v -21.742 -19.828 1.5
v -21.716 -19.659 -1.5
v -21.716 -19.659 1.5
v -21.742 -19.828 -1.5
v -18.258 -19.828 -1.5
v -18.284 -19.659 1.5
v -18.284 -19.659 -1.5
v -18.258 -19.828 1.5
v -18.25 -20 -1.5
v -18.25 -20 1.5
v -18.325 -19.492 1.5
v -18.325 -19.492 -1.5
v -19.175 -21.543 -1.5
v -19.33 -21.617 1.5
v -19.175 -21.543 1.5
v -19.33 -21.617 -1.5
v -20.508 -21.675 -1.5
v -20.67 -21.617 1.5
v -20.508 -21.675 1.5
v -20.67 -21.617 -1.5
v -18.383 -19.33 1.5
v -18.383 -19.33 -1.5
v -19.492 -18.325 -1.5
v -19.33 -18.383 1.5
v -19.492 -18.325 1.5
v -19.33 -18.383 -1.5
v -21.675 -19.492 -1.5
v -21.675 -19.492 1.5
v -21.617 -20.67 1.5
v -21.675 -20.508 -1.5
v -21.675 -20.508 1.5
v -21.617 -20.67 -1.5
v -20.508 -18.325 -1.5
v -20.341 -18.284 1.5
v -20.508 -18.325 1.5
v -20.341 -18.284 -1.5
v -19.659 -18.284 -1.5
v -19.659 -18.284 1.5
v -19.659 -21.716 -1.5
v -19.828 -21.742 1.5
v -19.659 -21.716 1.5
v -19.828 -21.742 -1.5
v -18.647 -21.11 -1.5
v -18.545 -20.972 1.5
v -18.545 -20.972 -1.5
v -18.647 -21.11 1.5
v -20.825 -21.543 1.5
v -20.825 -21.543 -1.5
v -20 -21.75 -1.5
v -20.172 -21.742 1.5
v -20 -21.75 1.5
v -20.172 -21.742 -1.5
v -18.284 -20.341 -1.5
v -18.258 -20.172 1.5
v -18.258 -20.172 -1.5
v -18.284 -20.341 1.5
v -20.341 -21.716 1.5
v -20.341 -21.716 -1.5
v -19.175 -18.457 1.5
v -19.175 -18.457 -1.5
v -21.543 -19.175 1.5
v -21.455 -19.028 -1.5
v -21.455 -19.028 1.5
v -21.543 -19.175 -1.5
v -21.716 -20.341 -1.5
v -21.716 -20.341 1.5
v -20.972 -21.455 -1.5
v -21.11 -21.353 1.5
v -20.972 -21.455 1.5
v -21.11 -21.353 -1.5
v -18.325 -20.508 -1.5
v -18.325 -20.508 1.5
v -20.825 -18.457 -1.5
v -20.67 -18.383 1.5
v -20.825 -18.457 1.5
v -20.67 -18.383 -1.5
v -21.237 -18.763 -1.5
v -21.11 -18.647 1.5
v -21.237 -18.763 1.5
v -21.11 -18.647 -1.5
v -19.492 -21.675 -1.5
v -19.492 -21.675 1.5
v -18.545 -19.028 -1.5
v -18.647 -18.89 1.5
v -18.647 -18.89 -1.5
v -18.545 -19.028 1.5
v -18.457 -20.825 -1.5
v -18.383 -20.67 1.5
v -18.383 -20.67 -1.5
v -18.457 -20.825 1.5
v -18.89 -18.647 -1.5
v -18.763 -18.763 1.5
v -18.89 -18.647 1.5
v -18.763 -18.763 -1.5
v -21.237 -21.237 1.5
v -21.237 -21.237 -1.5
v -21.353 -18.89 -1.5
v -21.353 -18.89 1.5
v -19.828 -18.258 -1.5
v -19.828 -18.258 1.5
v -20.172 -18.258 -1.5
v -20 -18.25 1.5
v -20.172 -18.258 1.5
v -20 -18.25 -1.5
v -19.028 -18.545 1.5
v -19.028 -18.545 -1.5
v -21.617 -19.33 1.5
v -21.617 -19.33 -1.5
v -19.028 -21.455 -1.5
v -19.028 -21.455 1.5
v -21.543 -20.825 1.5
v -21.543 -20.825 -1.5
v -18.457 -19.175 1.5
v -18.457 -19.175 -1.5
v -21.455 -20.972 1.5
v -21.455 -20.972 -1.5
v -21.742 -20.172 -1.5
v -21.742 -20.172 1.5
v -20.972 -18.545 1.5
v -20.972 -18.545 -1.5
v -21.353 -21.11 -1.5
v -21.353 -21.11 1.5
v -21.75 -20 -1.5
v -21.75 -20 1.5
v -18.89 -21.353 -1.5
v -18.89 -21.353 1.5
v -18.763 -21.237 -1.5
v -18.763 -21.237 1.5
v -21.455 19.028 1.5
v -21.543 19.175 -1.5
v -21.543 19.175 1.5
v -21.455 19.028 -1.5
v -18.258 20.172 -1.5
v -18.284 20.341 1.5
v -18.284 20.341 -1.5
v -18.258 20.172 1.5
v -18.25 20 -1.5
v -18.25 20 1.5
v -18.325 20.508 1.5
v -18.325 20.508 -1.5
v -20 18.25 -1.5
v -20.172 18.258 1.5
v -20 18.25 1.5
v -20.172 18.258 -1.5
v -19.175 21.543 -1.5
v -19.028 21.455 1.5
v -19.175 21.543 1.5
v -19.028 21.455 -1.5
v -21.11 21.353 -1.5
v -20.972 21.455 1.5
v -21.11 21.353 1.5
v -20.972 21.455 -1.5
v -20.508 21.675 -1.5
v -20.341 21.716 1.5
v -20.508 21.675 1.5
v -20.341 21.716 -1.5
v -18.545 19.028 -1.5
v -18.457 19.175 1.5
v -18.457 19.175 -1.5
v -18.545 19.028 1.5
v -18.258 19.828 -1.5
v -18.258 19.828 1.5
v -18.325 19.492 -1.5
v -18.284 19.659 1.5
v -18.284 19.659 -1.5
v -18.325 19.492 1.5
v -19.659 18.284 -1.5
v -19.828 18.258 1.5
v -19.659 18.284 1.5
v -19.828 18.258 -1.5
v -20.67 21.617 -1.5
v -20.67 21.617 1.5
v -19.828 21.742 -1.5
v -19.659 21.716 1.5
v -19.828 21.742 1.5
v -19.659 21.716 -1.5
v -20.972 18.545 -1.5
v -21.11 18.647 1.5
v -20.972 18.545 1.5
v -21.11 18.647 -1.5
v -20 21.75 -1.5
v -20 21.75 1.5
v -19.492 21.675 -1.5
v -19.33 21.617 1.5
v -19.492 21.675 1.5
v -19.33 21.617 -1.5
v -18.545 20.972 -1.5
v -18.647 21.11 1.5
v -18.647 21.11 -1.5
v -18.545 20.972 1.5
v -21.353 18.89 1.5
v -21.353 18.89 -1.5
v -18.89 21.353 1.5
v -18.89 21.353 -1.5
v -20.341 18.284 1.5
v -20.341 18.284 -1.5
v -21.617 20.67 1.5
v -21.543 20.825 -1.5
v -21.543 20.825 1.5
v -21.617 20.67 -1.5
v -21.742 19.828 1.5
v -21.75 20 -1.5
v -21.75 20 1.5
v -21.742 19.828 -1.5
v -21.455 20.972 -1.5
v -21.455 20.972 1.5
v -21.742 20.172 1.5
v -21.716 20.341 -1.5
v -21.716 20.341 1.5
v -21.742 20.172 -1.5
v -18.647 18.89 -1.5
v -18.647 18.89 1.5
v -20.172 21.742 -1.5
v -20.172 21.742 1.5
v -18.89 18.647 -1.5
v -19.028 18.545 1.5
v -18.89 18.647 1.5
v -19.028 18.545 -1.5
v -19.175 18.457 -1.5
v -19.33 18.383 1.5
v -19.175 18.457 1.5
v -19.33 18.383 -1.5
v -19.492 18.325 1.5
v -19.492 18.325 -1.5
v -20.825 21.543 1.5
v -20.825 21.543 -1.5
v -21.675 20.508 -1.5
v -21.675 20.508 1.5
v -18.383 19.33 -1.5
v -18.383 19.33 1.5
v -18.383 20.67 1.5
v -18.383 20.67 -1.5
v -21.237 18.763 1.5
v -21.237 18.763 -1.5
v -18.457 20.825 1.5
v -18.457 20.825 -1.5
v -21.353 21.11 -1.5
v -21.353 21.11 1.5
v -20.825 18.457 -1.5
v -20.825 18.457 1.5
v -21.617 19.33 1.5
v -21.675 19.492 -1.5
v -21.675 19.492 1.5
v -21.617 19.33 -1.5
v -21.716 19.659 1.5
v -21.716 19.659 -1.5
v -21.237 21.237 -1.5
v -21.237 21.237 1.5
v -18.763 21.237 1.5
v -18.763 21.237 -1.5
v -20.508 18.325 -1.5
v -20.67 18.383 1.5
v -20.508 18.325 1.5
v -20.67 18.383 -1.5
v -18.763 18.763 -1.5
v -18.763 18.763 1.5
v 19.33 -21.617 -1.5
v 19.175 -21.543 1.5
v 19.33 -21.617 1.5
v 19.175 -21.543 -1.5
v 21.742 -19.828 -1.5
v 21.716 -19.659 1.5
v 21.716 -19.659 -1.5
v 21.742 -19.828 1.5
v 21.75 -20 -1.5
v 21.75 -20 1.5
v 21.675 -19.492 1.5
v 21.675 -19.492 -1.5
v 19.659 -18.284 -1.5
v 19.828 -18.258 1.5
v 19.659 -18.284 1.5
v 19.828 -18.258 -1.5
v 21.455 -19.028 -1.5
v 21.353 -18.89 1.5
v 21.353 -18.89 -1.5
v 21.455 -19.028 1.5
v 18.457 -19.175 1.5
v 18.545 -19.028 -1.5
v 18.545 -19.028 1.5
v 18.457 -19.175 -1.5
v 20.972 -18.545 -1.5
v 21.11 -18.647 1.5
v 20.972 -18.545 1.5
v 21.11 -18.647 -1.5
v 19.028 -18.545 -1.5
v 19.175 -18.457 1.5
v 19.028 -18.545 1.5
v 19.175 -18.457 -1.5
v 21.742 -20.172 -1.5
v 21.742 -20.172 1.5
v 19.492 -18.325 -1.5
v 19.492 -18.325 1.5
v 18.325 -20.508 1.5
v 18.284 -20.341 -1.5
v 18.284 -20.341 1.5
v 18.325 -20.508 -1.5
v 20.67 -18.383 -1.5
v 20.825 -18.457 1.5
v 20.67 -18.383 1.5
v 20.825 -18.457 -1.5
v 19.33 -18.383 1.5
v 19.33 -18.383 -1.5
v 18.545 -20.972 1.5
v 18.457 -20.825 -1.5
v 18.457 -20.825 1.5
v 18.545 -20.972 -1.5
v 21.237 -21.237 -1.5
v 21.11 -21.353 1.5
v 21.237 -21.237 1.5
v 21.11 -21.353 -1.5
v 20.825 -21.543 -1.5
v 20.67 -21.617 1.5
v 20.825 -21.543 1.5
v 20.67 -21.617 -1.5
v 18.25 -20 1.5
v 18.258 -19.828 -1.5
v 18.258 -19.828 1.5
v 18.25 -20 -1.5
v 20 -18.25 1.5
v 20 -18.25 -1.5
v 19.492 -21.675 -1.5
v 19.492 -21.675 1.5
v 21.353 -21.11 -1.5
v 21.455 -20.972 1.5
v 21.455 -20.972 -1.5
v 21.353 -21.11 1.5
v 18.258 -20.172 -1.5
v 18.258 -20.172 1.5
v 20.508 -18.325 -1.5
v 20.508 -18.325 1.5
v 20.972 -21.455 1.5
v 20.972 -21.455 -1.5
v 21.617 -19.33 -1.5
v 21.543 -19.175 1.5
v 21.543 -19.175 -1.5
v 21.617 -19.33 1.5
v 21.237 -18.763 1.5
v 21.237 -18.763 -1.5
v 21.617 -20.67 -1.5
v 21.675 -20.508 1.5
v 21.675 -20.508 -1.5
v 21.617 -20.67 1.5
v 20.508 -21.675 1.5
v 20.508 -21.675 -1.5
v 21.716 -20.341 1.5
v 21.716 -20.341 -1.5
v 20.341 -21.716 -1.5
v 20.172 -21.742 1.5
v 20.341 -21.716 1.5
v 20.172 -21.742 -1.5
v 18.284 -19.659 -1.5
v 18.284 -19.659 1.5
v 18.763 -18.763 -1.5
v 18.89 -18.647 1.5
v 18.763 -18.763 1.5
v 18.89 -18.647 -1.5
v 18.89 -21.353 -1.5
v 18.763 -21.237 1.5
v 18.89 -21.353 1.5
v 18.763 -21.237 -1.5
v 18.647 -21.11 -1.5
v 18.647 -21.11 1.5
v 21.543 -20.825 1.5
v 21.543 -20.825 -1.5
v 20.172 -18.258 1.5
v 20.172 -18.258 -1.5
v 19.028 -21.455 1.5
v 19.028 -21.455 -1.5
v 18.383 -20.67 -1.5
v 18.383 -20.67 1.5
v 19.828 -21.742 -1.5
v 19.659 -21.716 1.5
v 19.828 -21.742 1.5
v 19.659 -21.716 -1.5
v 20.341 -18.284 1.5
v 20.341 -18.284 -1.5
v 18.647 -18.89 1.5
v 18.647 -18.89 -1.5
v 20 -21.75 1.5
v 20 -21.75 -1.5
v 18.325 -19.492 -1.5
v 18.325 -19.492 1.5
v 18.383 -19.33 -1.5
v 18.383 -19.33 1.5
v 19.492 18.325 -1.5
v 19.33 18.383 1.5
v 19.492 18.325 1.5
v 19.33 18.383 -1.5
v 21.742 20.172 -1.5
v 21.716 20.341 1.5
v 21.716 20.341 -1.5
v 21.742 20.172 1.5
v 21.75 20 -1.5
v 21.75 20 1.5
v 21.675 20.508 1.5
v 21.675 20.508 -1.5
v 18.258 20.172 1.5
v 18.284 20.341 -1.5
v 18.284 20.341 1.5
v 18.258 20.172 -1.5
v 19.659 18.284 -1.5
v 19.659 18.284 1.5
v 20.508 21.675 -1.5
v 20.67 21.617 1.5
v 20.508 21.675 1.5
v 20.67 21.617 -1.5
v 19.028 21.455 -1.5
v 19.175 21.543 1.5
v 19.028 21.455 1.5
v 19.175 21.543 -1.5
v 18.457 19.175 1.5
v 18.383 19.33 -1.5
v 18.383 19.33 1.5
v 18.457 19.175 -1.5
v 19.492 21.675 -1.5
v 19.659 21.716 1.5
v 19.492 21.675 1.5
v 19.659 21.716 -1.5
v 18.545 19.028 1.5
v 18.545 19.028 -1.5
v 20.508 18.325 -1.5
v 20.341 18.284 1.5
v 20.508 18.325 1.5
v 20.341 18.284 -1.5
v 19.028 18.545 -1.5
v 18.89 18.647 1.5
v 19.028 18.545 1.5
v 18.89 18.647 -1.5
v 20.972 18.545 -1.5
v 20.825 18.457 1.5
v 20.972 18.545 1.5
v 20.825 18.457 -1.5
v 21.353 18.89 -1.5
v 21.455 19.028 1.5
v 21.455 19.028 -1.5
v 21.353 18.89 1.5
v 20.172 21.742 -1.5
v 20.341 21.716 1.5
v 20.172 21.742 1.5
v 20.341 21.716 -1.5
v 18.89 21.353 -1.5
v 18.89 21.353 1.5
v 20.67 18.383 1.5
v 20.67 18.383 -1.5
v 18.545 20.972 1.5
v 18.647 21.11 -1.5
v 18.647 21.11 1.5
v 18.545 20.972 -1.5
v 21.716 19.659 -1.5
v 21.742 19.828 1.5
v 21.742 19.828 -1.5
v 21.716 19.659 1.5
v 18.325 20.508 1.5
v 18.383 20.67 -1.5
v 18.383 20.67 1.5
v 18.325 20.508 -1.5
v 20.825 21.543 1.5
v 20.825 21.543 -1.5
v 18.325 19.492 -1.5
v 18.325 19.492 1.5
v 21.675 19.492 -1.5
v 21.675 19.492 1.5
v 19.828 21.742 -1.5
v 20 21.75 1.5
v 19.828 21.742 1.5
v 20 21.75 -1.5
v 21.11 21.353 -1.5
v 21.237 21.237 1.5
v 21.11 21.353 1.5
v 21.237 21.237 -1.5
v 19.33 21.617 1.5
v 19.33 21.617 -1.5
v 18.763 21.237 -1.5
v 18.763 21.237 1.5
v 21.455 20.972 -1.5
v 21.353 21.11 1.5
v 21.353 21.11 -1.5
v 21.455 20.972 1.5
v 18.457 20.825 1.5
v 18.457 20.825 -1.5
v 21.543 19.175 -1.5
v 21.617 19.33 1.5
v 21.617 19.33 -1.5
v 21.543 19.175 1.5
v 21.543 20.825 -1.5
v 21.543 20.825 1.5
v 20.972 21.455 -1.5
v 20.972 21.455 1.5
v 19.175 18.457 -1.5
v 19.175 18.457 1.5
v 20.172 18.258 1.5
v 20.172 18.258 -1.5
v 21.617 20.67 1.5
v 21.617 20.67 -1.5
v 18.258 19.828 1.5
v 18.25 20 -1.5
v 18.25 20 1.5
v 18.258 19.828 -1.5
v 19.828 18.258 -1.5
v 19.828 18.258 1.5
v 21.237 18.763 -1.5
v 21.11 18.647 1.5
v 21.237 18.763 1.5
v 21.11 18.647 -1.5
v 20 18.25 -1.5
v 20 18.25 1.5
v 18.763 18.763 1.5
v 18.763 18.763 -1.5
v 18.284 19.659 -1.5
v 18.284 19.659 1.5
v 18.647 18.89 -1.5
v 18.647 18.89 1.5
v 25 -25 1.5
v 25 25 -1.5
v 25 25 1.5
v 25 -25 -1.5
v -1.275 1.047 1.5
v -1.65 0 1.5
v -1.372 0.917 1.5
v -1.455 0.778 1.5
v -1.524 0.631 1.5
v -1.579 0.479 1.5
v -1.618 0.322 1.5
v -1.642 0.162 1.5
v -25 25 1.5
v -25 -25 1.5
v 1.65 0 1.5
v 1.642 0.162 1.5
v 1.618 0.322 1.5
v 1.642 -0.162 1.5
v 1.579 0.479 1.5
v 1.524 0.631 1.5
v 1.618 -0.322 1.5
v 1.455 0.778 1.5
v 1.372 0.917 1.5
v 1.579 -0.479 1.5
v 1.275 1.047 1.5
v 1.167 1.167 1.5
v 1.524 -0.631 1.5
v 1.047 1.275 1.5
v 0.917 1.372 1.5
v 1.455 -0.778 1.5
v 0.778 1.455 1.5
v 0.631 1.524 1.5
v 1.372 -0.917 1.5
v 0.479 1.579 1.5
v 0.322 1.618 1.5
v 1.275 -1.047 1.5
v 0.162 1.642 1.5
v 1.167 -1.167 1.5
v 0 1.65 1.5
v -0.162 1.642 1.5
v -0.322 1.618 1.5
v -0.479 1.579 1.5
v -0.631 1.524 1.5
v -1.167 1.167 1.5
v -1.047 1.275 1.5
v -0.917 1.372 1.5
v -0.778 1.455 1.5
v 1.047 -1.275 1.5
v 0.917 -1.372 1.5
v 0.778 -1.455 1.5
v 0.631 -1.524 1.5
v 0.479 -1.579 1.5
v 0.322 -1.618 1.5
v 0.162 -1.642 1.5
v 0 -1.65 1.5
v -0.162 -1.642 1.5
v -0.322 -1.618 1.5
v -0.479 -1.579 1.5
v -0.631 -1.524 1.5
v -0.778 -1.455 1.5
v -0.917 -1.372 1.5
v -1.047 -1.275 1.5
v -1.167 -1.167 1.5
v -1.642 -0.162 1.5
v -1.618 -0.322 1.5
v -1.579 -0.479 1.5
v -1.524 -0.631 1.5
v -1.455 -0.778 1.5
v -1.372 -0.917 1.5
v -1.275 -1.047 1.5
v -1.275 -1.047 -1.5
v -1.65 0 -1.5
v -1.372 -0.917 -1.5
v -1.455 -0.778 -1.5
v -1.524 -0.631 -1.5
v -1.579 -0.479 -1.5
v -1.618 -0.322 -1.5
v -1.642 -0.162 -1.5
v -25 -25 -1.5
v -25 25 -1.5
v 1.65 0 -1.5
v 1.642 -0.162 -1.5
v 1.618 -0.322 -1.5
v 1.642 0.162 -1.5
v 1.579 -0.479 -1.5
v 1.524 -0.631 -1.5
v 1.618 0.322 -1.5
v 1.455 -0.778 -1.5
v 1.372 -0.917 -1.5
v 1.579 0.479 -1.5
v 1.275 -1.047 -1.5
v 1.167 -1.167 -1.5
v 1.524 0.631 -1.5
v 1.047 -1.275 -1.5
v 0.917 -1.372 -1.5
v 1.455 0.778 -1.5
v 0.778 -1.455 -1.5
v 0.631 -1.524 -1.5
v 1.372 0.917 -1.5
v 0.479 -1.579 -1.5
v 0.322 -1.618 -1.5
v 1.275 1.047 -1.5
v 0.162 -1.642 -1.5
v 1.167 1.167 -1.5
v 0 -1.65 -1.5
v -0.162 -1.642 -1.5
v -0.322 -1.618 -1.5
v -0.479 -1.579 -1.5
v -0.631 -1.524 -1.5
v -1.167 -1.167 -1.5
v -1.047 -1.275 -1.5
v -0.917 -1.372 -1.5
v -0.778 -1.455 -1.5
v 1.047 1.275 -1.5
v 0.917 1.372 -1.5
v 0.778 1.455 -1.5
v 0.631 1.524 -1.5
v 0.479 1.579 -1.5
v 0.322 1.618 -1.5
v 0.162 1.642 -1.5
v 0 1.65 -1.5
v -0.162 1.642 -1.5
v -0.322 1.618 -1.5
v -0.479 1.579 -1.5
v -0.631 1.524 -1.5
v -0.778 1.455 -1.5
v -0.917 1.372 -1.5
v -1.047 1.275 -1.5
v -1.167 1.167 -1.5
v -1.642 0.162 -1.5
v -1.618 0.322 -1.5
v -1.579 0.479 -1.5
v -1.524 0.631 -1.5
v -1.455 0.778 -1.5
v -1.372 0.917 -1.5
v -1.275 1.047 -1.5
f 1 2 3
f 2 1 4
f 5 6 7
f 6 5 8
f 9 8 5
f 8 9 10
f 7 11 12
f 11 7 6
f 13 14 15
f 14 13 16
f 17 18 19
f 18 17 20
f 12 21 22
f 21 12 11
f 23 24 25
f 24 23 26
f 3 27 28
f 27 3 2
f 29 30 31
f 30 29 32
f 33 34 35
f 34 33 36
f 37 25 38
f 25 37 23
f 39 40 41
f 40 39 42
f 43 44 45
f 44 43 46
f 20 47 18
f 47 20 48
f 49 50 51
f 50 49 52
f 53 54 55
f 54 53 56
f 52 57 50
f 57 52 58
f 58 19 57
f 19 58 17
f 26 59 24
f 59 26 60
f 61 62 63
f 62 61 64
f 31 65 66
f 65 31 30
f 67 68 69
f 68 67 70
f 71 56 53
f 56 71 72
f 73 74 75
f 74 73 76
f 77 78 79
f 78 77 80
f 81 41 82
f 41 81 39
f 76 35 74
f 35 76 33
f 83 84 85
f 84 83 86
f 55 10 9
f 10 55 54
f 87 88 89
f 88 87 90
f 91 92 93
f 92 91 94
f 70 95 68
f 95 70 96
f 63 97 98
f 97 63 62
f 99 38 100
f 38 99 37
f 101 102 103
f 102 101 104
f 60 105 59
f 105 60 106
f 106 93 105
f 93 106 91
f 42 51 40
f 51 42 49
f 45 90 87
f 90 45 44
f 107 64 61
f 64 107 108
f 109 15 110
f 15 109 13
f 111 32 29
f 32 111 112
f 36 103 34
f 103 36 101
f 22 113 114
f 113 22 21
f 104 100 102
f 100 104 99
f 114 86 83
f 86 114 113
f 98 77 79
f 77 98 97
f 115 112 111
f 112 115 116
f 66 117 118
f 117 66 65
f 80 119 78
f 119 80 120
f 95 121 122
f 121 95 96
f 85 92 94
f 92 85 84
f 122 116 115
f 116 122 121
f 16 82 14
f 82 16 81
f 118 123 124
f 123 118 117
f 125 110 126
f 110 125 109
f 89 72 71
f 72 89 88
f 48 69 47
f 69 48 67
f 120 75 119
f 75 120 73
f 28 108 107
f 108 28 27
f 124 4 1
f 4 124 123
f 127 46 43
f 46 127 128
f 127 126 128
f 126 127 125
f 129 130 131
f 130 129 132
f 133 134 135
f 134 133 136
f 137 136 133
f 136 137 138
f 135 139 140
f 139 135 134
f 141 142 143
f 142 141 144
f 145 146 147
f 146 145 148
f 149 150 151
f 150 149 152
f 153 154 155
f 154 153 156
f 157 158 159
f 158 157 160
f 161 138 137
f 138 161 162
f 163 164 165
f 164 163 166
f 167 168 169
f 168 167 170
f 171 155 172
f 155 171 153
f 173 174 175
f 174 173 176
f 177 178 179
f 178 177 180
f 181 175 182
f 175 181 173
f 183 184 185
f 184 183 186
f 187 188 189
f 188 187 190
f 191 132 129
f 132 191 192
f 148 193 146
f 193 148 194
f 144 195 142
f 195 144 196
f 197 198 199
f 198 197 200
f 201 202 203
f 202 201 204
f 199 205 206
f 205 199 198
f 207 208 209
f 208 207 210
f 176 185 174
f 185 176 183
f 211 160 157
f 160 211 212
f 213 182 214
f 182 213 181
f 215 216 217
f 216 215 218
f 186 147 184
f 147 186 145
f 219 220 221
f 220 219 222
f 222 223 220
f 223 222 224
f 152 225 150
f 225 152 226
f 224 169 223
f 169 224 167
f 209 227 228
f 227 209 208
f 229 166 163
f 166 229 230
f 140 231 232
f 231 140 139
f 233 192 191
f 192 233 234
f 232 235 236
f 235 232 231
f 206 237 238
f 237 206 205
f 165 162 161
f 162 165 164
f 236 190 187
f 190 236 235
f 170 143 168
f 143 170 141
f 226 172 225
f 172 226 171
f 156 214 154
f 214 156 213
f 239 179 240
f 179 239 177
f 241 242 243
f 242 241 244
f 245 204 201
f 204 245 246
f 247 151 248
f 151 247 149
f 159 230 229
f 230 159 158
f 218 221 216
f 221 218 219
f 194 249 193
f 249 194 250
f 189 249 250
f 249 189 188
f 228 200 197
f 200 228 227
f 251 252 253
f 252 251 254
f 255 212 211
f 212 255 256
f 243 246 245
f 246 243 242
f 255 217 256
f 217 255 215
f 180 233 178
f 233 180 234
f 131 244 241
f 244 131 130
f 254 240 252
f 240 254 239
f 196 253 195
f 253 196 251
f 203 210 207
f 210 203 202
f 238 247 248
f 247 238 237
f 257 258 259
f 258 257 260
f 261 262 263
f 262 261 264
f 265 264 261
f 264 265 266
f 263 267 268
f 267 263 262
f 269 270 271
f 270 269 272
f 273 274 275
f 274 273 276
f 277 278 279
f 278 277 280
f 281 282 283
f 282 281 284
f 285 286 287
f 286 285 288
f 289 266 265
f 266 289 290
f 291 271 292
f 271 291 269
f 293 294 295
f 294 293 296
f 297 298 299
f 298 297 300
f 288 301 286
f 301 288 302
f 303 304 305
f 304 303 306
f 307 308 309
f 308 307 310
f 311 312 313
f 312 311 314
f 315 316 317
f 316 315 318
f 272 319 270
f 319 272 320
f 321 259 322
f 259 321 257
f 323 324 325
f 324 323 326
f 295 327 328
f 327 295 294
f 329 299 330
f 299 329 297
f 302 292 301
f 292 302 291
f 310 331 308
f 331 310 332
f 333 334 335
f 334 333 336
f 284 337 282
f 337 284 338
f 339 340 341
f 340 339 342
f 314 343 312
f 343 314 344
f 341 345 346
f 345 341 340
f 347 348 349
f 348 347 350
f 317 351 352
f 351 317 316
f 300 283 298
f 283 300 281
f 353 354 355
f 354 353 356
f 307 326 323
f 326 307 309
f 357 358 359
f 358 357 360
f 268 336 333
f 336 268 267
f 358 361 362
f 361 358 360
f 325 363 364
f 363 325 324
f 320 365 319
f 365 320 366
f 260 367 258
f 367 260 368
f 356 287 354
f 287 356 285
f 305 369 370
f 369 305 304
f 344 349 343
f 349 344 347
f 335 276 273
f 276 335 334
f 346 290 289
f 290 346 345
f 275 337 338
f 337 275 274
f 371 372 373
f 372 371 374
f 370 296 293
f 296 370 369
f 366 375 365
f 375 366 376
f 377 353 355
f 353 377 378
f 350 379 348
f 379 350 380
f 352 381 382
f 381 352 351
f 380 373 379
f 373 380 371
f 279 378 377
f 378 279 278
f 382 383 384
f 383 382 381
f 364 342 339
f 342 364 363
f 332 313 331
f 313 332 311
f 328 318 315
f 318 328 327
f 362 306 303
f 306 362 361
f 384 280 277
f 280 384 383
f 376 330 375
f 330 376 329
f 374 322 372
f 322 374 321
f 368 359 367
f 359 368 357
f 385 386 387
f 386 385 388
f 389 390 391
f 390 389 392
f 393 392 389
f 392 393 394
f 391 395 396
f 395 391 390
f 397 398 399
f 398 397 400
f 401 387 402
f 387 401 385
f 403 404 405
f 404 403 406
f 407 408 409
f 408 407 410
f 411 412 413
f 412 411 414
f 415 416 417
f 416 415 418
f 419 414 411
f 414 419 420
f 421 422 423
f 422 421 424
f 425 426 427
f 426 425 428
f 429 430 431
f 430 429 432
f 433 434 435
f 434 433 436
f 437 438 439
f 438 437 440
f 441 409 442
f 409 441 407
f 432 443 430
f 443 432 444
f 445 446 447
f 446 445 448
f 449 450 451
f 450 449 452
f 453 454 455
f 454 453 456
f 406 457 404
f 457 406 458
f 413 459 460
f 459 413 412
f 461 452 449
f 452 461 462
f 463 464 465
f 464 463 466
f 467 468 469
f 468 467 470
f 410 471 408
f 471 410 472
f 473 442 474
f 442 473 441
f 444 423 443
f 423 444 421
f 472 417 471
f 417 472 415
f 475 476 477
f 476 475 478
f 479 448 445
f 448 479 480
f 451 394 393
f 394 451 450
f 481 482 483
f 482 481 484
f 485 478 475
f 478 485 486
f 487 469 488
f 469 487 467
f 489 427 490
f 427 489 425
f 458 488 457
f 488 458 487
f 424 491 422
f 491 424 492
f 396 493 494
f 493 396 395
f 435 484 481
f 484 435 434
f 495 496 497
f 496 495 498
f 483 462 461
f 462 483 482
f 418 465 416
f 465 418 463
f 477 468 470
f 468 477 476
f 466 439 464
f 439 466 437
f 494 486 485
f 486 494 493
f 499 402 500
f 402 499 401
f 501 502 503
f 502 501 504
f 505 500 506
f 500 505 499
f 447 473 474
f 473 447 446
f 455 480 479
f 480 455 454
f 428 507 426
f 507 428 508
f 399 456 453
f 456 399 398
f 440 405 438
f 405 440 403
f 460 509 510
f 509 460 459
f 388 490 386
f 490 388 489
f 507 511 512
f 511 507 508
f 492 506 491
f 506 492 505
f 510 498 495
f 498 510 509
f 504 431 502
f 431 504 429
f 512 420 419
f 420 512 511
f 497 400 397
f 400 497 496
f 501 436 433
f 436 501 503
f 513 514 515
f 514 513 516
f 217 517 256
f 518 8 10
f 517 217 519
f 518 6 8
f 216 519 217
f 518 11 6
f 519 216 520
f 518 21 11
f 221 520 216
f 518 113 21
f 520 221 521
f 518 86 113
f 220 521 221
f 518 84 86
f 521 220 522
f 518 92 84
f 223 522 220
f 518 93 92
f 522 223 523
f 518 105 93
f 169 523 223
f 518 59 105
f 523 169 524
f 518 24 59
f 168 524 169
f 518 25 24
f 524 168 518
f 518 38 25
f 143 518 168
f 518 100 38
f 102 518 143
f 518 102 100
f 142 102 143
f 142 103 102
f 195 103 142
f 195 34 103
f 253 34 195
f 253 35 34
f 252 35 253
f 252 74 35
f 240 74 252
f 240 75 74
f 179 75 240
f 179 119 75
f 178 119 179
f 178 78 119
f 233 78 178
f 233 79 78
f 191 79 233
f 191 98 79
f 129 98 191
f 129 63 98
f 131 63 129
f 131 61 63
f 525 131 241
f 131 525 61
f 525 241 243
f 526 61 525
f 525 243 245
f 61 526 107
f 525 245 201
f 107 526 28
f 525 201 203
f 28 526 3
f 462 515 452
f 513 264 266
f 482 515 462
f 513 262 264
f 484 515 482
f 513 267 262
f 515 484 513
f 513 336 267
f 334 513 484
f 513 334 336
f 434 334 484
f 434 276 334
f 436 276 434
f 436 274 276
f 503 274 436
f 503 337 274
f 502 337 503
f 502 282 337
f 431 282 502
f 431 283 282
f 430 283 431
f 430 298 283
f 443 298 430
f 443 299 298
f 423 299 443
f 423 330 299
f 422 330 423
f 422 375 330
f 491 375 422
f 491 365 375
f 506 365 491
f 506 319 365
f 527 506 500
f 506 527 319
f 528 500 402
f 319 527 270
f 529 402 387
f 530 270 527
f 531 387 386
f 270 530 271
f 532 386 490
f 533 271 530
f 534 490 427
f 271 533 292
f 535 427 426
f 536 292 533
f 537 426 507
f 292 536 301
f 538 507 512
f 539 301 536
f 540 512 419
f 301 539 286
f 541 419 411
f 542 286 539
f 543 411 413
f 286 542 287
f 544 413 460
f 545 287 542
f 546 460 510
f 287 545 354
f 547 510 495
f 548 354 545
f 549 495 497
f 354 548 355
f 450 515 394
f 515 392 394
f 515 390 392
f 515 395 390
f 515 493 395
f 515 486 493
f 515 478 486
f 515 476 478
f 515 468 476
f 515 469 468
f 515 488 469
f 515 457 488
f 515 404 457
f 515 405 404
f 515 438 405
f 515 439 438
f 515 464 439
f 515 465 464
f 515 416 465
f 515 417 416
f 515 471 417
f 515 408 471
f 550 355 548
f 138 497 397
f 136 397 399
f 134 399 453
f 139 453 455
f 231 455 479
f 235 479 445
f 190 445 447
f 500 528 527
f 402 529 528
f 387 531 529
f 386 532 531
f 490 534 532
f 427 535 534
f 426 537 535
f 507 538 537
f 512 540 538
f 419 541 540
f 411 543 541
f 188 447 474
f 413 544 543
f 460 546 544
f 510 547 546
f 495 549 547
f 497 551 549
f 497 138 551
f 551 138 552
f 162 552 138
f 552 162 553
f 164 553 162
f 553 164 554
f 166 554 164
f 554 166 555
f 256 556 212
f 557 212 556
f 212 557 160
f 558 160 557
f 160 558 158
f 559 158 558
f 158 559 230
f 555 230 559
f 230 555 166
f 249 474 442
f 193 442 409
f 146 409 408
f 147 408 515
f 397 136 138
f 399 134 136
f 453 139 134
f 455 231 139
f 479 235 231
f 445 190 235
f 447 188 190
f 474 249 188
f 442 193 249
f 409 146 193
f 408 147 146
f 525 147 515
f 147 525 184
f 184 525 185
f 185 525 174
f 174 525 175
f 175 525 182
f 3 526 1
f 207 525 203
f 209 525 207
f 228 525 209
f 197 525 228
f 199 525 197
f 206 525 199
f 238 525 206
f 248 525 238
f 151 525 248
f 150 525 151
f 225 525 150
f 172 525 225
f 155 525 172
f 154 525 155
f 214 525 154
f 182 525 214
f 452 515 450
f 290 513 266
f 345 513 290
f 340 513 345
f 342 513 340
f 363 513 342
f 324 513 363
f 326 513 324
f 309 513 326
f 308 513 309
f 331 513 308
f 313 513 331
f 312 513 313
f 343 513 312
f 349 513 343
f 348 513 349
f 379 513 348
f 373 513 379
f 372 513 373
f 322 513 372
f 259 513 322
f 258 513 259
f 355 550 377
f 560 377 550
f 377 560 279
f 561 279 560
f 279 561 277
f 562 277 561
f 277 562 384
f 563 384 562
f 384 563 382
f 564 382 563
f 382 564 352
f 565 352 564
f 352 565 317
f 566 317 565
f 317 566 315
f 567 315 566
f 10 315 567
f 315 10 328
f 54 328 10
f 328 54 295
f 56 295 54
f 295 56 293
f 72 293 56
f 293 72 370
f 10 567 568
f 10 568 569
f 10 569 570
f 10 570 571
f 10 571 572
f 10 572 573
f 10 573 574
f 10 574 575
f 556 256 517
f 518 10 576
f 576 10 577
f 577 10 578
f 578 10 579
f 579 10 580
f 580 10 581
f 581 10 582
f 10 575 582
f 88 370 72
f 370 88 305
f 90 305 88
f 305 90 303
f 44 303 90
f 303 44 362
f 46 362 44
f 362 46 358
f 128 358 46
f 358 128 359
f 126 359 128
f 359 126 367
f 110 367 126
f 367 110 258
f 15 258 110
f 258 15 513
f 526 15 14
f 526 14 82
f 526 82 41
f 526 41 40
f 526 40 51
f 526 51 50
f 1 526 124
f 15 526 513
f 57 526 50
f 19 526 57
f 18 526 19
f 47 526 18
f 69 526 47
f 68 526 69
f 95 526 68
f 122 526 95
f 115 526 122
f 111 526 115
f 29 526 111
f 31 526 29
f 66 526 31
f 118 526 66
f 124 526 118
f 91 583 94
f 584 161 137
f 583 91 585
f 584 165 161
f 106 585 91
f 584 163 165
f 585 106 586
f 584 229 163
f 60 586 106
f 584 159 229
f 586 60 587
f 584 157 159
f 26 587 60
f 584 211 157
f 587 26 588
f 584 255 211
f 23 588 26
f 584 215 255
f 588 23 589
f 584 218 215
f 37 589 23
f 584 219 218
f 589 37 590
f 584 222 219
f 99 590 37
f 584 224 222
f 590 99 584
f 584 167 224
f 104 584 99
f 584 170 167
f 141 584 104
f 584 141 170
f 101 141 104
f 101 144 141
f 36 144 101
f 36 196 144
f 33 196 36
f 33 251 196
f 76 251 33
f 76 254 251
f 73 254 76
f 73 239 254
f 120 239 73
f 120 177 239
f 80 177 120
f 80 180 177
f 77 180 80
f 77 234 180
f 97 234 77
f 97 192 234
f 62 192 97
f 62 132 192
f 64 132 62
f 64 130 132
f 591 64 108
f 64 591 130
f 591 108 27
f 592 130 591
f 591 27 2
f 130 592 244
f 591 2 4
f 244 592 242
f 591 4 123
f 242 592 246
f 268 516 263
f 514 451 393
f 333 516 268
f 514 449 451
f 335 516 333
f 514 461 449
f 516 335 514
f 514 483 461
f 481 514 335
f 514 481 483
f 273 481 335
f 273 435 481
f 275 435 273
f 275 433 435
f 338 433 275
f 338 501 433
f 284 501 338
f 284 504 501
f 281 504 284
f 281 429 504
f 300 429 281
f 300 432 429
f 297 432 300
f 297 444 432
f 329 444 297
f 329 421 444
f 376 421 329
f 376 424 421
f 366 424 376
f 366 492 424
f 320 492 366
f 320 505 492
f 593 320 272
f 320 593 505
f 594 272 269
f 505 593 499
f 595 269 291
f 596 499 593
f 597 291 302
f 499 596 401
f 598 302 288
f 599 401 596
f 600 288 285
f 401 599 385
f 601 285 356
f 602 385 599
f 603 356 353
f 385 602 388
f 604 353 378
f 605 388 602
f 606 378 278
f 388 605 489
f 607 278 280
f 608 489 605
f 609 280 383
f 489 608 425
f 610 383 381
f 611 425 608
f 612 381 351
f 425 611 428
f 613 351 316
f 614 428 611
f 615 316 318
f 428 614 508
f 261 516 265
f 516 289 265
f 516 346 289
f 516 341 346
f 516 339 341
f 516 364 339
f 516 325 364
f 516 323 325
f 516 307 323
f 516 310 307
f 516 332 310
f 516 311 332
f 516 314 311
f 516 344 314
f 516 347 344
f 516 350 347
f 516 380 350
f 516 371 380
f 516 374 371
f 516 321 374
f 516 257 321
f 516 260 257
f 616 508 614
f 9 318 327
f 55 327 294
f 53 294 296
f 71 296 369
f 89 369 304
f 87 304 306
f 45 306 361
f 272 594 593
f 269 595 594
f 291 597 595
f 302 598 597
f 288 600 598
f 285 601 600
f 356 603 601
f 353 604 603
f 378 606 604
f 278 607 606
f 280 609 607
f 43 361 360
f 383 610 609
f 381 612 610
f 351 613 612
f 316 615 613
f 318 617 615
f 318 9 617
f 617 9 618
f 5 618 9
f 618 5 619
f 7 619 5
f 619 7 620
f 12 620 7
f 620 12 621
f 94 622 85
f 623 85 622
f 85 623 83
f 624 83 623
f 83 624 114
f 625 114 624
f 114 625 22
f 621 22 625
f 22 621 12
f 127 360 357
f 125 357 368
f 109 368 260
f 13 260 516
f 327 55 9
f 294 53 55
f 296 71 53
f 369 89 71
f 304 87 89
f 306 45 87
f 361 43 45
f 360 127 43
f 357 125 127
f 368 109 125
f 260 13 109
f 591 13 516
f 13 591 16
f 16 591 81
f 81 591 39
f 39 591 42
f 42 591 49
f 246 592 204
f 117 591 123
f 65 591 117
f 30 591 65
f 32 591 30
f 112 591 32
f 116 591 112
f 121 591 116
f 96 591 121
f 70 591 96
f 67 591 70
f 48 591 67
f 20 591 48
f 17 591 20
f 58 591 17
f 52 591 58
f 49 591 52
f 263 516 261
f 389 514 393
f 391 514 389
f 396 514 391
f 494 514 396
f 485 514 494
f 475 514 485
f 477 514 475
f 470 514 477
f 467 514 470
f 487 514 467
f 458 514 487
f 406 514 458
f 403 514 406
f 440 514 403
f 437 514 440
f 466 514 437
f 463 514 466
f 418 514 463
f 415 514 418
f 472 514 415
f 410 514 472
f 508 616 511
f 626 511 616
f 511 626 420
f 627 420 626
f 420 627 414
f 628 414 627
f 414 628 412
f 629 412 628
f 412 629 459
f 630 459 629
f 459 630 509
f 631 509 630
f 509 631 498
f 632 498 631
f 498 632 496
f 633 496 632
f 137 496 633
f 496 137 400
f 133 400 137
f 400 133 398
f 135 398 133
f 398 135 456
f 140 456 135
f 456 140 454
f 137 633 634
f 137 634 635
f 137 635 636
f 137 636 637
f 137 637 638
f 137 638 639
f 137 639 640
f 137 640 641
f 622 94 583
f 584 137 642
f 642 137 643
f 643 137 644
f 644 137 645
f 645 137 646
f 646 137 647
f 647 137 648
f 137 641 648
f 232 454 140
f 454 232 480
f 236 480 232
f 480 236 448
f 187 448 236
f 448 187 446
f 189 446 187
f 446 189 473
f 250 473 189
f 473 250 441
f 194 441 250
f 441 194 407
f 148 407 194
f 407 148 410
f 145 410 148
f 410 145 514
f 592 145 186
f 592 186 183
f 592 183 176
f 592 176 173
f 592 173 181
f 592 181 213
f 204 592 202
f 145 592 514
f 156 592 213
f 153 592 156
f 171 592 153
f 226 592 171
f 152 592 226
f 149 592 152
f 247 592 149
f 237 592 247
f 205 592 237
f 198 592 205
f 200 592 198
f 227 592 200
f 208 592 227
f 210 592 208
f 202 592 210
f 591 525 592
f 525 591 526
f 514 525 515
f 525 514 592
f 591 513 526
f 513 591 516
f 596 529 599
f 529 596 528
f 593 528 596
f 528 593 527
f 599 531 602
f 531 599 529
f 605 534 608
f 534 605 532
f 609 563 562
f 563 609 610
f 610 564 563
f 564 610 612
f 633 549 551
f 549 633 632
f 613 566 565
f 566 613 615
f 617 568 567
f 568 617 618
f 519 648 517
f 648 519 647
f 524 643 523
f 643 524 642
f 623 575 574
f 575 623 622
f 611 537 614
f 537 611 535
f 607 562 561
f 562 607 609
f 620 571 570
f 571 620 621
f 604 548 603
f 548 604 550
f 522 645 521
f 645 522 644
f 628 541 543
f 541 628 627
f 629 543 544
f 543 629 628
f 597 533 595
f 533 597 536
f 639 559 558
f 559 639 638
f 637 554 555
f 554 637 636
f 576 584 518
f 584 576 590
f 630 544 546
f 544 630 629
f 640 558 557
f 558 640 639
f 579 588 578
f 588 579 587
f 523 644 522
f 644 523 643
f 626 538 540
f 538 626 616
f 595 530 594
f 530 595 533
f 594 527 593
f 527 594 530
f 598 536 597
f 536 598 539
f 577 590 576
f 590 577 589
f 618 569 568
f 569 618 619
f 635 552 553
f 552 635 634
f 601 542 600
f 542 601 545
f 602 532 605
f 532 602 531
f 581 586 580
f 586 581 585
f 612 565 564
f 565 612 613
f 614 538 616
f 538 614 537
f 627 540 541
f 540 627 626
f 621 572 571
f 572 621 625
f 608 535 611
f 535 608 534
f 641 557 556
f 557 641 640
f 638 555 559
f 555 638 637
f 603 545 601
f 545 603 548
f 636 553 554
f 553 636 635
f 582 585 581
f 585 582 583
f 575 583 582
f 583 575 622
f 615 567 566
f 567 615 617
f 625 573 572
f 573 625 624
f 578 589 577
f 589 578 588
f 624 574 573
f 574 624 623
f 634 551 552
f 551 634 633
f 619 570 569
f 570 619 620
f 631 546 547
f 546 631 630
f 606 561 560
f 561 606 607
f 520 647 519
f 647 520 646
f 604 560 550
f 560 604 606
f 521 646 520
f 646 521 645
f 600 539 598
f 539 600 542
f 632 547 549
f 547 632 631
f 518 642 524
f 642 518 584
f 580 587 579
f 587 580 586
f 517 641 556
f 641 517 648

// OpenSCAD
// ============================================================
// ZONE 3 FOAM GEAR (16T) + FOAM CURL - PRINT PARTS
// ============================================================
// Export individual parts for 3D printing
// Use PART_SELECT to choose which part to export
// ============================================================

// === PART SELECTION ===
// 1 = Base plate only
// 2 = Gear only (16T)
// 3 = Shaft only
// 4 = Gear + arm + foam curl as one printable piece
PART_SELECT = 1;  // [1, 2, 3, 4]

// Quality settings
$fn = 64;

// === DIMENSIONS (all in mm) ===
// Gear parameters
GEAR_TEETH = 16;
GEAR_MODULE = 1.0;
GEAR_PITCH_RADIUS = 8;
GEAR_OUTER_RADIUS = 9;
GEAR_THICKNESS = 5;
SHAFT_HOLE_DIA = 3.3;

// Shaft parameters
SHAFT_DIA = 3.0;
SHAFT_LENGTH = 15;

// Arm parameters
ARM_LENGTH = 20;
ARM_WIDTH = 4;
ARM_HEIGHT = 3;

// Foam curl parameters
CURL_MAIN_SPHERE = 6;
CURL_MID_SPHERE = 5;
CURL_BASE_SPHERE = 4;

// Base plate
BASE_SIZE = 50;
BASE_THICKNESS = 3;
BASE_HOLE_DIA = 3.3;

// === MODULES ===

// Part 1: Base plate
module part_base_plate() {
    difference() {
        cube([BASE_SIZE, BASE_SIZE, BASE_THICKNESS], center=true);

        // Center shaft hole
        cylinder(h=BASE_THICKNESS + 2, d=BASE_HOLE_DIA, center=true);

        // Corner mounting holes
        for (x = [-1, 1], y = [-1, 1]) {
            translate([x * 20, y * 20, 0])
            cylinder(h=BASE_THICKNESS + 2, d=3.5, center=true);
        }
    }
}

// Part 2: 16T Gear only
module part_gear_only() {
    difference() {
        union() {
            // Base cylinder
            cylinder(h=GEAR_THICKNESS, r=GEAR_PITCH_RADIUS - 0.5, center=false);

            // Teeth
            for (i = [0:GEAR_TEETH-1]) {
                rotate([0, 0, i * 360/GEAR_TEETH])
                translate([GEAR_PITCH_RADIUS - 0.5, 0, 0])
                linear_extrude(height=GEAR_THICKNESS)
                polygon([
                    [0, -0.8],
                    [1.8, -0.4],
                    [1.8, 0.4],
                    [0, 0.8]
                ]);
            }
        }
        // Center shaft hole
        translate([0, 0, -1])
        cylinder(h=GEAR_THICKNESS + 2, d=SHAFT_HOLE_DIA, center=false);
    }
}

// Part 3: Shaft
module part_shaft() {
    cylinder(h=SHAFT_LENGTH, d=SHAFT_DIA, center=false);
}

// Part 4: Gear + Arm + Foam Curl (combined print piece)
module part_gear_arm_foam() {
    // Gear
    difference() {
        union() {
            // Base cylinder
            cylinder(h=GEAR_THICKNESS, r=GEAR_PITCH_RADIUS - 0.5, center=false);

            // Teeth
            for (i = [0:GEAR_TEETH-1]) {
                rotate([0, 0, i * 360/GEAR_TEETH])
                translate([GEAR_PITCH_RADIUS - 0.5, 0, 0])
                linear_extrude(height=GEAR_THICKNESS)
                polygon([
                    [0, -0.8],
                    [1.8, -0.4],
                    [1.8, 0.4],
                    [0, 0.8]
                ]);
            }

            // Arm
            translate([GEAR_PITCH_RADIUS/2, -ARM_WIDTH/2, GEAR_THICKNESS])
            cube([ARM_LENGTH - GEAR_PITCH_RADIUS/2, ARM_WIDTH, ARM_HEIGHT]);

            // Arm fillet
            translate([0, 0, GEAR_THICKNESS])
            cylinder(h=ARM_HEIGHT, r=ARM_WIDTH/2, center=false);

            // Foam curl at end of arm
            translate([ARM_LENGTH, 0, GEAR_THICKNESS + ARM_HEIGHT/2])
            rotate([0, 0, -30])
            foam_curl_solid();
        }
        // Center shaft hole
        translate([0, 0, -1])
        cylinder(h=GEAR_THICKNESS + 2, d=SHAFT_HOLE_DIA, center=false);
    }
}

// Foam curl shape (solid for printing)
module foam_curl_solid() {
    // Main curl body
    hull() {
        // Main curl tip
        translate([0, 0, 8])
        sphere(d=CURL_MAIN_SPHERE);

        // Curl body
        translate([-4, 0, 5])
        sphere(d=CURL_MID_SPHERE);

        // Lower curl
        translate([-7, 0, 1])
        sphere(d=CURL_BASE_SPHERE);

        // Back of curl
        translate([-3, 0, -2])
        sphere(d=3);

        // Extension
        translate([2, 0, 4])
        sphere(d=4);
    }

    // Spray detail
    for (i = [0:4]) {
        translate([2 + i*1.5, 0, 9 + i*0.5])
        sphere(d=2 - i*0.3);
    }

    // Side spray
    for (i = [0:2]) {
        translate([0, 3 + i*2, 7 - i])
        sphere(d=1.5);
        translate([0, -3 - i*2, 7 - i])
        sphere(d=1.5);
    }
}

// === RENDER SELECTED PART ===
if (PART_SELECT == 1) {
    echo("Rendering: Part 1 - Base Plate");
    part_base_plate();
}
else if (PART_SELECT == 2) {
    echo("Rendering: Part 2 - 16T Gear Only");
    part_gear_only();
}
else if (PART_SELECT == 3) {
    echo("Rendering: Part 3 - Shaft");
    part_shaft();
}
else if (PART_SELECT == 4) {
    echo("Rendering: Part 4 - Gear + Arm + Foam Curl");
    part_gear_arm_foam();
}
else {
    echo("ERROR: Invalid PART_SELECT value. Use 1, 2, 3, or 4.");
}

// Debug output
echo(str("=== ZONE 3 PRINT PARTS ==="));
echo(str("Selected part: ", PART_SELECT));
echo(str("Gear teeth: ", GEAR_TEETH));
echo(str("Arm length: ", ARM_LENGTH, "mm"));
